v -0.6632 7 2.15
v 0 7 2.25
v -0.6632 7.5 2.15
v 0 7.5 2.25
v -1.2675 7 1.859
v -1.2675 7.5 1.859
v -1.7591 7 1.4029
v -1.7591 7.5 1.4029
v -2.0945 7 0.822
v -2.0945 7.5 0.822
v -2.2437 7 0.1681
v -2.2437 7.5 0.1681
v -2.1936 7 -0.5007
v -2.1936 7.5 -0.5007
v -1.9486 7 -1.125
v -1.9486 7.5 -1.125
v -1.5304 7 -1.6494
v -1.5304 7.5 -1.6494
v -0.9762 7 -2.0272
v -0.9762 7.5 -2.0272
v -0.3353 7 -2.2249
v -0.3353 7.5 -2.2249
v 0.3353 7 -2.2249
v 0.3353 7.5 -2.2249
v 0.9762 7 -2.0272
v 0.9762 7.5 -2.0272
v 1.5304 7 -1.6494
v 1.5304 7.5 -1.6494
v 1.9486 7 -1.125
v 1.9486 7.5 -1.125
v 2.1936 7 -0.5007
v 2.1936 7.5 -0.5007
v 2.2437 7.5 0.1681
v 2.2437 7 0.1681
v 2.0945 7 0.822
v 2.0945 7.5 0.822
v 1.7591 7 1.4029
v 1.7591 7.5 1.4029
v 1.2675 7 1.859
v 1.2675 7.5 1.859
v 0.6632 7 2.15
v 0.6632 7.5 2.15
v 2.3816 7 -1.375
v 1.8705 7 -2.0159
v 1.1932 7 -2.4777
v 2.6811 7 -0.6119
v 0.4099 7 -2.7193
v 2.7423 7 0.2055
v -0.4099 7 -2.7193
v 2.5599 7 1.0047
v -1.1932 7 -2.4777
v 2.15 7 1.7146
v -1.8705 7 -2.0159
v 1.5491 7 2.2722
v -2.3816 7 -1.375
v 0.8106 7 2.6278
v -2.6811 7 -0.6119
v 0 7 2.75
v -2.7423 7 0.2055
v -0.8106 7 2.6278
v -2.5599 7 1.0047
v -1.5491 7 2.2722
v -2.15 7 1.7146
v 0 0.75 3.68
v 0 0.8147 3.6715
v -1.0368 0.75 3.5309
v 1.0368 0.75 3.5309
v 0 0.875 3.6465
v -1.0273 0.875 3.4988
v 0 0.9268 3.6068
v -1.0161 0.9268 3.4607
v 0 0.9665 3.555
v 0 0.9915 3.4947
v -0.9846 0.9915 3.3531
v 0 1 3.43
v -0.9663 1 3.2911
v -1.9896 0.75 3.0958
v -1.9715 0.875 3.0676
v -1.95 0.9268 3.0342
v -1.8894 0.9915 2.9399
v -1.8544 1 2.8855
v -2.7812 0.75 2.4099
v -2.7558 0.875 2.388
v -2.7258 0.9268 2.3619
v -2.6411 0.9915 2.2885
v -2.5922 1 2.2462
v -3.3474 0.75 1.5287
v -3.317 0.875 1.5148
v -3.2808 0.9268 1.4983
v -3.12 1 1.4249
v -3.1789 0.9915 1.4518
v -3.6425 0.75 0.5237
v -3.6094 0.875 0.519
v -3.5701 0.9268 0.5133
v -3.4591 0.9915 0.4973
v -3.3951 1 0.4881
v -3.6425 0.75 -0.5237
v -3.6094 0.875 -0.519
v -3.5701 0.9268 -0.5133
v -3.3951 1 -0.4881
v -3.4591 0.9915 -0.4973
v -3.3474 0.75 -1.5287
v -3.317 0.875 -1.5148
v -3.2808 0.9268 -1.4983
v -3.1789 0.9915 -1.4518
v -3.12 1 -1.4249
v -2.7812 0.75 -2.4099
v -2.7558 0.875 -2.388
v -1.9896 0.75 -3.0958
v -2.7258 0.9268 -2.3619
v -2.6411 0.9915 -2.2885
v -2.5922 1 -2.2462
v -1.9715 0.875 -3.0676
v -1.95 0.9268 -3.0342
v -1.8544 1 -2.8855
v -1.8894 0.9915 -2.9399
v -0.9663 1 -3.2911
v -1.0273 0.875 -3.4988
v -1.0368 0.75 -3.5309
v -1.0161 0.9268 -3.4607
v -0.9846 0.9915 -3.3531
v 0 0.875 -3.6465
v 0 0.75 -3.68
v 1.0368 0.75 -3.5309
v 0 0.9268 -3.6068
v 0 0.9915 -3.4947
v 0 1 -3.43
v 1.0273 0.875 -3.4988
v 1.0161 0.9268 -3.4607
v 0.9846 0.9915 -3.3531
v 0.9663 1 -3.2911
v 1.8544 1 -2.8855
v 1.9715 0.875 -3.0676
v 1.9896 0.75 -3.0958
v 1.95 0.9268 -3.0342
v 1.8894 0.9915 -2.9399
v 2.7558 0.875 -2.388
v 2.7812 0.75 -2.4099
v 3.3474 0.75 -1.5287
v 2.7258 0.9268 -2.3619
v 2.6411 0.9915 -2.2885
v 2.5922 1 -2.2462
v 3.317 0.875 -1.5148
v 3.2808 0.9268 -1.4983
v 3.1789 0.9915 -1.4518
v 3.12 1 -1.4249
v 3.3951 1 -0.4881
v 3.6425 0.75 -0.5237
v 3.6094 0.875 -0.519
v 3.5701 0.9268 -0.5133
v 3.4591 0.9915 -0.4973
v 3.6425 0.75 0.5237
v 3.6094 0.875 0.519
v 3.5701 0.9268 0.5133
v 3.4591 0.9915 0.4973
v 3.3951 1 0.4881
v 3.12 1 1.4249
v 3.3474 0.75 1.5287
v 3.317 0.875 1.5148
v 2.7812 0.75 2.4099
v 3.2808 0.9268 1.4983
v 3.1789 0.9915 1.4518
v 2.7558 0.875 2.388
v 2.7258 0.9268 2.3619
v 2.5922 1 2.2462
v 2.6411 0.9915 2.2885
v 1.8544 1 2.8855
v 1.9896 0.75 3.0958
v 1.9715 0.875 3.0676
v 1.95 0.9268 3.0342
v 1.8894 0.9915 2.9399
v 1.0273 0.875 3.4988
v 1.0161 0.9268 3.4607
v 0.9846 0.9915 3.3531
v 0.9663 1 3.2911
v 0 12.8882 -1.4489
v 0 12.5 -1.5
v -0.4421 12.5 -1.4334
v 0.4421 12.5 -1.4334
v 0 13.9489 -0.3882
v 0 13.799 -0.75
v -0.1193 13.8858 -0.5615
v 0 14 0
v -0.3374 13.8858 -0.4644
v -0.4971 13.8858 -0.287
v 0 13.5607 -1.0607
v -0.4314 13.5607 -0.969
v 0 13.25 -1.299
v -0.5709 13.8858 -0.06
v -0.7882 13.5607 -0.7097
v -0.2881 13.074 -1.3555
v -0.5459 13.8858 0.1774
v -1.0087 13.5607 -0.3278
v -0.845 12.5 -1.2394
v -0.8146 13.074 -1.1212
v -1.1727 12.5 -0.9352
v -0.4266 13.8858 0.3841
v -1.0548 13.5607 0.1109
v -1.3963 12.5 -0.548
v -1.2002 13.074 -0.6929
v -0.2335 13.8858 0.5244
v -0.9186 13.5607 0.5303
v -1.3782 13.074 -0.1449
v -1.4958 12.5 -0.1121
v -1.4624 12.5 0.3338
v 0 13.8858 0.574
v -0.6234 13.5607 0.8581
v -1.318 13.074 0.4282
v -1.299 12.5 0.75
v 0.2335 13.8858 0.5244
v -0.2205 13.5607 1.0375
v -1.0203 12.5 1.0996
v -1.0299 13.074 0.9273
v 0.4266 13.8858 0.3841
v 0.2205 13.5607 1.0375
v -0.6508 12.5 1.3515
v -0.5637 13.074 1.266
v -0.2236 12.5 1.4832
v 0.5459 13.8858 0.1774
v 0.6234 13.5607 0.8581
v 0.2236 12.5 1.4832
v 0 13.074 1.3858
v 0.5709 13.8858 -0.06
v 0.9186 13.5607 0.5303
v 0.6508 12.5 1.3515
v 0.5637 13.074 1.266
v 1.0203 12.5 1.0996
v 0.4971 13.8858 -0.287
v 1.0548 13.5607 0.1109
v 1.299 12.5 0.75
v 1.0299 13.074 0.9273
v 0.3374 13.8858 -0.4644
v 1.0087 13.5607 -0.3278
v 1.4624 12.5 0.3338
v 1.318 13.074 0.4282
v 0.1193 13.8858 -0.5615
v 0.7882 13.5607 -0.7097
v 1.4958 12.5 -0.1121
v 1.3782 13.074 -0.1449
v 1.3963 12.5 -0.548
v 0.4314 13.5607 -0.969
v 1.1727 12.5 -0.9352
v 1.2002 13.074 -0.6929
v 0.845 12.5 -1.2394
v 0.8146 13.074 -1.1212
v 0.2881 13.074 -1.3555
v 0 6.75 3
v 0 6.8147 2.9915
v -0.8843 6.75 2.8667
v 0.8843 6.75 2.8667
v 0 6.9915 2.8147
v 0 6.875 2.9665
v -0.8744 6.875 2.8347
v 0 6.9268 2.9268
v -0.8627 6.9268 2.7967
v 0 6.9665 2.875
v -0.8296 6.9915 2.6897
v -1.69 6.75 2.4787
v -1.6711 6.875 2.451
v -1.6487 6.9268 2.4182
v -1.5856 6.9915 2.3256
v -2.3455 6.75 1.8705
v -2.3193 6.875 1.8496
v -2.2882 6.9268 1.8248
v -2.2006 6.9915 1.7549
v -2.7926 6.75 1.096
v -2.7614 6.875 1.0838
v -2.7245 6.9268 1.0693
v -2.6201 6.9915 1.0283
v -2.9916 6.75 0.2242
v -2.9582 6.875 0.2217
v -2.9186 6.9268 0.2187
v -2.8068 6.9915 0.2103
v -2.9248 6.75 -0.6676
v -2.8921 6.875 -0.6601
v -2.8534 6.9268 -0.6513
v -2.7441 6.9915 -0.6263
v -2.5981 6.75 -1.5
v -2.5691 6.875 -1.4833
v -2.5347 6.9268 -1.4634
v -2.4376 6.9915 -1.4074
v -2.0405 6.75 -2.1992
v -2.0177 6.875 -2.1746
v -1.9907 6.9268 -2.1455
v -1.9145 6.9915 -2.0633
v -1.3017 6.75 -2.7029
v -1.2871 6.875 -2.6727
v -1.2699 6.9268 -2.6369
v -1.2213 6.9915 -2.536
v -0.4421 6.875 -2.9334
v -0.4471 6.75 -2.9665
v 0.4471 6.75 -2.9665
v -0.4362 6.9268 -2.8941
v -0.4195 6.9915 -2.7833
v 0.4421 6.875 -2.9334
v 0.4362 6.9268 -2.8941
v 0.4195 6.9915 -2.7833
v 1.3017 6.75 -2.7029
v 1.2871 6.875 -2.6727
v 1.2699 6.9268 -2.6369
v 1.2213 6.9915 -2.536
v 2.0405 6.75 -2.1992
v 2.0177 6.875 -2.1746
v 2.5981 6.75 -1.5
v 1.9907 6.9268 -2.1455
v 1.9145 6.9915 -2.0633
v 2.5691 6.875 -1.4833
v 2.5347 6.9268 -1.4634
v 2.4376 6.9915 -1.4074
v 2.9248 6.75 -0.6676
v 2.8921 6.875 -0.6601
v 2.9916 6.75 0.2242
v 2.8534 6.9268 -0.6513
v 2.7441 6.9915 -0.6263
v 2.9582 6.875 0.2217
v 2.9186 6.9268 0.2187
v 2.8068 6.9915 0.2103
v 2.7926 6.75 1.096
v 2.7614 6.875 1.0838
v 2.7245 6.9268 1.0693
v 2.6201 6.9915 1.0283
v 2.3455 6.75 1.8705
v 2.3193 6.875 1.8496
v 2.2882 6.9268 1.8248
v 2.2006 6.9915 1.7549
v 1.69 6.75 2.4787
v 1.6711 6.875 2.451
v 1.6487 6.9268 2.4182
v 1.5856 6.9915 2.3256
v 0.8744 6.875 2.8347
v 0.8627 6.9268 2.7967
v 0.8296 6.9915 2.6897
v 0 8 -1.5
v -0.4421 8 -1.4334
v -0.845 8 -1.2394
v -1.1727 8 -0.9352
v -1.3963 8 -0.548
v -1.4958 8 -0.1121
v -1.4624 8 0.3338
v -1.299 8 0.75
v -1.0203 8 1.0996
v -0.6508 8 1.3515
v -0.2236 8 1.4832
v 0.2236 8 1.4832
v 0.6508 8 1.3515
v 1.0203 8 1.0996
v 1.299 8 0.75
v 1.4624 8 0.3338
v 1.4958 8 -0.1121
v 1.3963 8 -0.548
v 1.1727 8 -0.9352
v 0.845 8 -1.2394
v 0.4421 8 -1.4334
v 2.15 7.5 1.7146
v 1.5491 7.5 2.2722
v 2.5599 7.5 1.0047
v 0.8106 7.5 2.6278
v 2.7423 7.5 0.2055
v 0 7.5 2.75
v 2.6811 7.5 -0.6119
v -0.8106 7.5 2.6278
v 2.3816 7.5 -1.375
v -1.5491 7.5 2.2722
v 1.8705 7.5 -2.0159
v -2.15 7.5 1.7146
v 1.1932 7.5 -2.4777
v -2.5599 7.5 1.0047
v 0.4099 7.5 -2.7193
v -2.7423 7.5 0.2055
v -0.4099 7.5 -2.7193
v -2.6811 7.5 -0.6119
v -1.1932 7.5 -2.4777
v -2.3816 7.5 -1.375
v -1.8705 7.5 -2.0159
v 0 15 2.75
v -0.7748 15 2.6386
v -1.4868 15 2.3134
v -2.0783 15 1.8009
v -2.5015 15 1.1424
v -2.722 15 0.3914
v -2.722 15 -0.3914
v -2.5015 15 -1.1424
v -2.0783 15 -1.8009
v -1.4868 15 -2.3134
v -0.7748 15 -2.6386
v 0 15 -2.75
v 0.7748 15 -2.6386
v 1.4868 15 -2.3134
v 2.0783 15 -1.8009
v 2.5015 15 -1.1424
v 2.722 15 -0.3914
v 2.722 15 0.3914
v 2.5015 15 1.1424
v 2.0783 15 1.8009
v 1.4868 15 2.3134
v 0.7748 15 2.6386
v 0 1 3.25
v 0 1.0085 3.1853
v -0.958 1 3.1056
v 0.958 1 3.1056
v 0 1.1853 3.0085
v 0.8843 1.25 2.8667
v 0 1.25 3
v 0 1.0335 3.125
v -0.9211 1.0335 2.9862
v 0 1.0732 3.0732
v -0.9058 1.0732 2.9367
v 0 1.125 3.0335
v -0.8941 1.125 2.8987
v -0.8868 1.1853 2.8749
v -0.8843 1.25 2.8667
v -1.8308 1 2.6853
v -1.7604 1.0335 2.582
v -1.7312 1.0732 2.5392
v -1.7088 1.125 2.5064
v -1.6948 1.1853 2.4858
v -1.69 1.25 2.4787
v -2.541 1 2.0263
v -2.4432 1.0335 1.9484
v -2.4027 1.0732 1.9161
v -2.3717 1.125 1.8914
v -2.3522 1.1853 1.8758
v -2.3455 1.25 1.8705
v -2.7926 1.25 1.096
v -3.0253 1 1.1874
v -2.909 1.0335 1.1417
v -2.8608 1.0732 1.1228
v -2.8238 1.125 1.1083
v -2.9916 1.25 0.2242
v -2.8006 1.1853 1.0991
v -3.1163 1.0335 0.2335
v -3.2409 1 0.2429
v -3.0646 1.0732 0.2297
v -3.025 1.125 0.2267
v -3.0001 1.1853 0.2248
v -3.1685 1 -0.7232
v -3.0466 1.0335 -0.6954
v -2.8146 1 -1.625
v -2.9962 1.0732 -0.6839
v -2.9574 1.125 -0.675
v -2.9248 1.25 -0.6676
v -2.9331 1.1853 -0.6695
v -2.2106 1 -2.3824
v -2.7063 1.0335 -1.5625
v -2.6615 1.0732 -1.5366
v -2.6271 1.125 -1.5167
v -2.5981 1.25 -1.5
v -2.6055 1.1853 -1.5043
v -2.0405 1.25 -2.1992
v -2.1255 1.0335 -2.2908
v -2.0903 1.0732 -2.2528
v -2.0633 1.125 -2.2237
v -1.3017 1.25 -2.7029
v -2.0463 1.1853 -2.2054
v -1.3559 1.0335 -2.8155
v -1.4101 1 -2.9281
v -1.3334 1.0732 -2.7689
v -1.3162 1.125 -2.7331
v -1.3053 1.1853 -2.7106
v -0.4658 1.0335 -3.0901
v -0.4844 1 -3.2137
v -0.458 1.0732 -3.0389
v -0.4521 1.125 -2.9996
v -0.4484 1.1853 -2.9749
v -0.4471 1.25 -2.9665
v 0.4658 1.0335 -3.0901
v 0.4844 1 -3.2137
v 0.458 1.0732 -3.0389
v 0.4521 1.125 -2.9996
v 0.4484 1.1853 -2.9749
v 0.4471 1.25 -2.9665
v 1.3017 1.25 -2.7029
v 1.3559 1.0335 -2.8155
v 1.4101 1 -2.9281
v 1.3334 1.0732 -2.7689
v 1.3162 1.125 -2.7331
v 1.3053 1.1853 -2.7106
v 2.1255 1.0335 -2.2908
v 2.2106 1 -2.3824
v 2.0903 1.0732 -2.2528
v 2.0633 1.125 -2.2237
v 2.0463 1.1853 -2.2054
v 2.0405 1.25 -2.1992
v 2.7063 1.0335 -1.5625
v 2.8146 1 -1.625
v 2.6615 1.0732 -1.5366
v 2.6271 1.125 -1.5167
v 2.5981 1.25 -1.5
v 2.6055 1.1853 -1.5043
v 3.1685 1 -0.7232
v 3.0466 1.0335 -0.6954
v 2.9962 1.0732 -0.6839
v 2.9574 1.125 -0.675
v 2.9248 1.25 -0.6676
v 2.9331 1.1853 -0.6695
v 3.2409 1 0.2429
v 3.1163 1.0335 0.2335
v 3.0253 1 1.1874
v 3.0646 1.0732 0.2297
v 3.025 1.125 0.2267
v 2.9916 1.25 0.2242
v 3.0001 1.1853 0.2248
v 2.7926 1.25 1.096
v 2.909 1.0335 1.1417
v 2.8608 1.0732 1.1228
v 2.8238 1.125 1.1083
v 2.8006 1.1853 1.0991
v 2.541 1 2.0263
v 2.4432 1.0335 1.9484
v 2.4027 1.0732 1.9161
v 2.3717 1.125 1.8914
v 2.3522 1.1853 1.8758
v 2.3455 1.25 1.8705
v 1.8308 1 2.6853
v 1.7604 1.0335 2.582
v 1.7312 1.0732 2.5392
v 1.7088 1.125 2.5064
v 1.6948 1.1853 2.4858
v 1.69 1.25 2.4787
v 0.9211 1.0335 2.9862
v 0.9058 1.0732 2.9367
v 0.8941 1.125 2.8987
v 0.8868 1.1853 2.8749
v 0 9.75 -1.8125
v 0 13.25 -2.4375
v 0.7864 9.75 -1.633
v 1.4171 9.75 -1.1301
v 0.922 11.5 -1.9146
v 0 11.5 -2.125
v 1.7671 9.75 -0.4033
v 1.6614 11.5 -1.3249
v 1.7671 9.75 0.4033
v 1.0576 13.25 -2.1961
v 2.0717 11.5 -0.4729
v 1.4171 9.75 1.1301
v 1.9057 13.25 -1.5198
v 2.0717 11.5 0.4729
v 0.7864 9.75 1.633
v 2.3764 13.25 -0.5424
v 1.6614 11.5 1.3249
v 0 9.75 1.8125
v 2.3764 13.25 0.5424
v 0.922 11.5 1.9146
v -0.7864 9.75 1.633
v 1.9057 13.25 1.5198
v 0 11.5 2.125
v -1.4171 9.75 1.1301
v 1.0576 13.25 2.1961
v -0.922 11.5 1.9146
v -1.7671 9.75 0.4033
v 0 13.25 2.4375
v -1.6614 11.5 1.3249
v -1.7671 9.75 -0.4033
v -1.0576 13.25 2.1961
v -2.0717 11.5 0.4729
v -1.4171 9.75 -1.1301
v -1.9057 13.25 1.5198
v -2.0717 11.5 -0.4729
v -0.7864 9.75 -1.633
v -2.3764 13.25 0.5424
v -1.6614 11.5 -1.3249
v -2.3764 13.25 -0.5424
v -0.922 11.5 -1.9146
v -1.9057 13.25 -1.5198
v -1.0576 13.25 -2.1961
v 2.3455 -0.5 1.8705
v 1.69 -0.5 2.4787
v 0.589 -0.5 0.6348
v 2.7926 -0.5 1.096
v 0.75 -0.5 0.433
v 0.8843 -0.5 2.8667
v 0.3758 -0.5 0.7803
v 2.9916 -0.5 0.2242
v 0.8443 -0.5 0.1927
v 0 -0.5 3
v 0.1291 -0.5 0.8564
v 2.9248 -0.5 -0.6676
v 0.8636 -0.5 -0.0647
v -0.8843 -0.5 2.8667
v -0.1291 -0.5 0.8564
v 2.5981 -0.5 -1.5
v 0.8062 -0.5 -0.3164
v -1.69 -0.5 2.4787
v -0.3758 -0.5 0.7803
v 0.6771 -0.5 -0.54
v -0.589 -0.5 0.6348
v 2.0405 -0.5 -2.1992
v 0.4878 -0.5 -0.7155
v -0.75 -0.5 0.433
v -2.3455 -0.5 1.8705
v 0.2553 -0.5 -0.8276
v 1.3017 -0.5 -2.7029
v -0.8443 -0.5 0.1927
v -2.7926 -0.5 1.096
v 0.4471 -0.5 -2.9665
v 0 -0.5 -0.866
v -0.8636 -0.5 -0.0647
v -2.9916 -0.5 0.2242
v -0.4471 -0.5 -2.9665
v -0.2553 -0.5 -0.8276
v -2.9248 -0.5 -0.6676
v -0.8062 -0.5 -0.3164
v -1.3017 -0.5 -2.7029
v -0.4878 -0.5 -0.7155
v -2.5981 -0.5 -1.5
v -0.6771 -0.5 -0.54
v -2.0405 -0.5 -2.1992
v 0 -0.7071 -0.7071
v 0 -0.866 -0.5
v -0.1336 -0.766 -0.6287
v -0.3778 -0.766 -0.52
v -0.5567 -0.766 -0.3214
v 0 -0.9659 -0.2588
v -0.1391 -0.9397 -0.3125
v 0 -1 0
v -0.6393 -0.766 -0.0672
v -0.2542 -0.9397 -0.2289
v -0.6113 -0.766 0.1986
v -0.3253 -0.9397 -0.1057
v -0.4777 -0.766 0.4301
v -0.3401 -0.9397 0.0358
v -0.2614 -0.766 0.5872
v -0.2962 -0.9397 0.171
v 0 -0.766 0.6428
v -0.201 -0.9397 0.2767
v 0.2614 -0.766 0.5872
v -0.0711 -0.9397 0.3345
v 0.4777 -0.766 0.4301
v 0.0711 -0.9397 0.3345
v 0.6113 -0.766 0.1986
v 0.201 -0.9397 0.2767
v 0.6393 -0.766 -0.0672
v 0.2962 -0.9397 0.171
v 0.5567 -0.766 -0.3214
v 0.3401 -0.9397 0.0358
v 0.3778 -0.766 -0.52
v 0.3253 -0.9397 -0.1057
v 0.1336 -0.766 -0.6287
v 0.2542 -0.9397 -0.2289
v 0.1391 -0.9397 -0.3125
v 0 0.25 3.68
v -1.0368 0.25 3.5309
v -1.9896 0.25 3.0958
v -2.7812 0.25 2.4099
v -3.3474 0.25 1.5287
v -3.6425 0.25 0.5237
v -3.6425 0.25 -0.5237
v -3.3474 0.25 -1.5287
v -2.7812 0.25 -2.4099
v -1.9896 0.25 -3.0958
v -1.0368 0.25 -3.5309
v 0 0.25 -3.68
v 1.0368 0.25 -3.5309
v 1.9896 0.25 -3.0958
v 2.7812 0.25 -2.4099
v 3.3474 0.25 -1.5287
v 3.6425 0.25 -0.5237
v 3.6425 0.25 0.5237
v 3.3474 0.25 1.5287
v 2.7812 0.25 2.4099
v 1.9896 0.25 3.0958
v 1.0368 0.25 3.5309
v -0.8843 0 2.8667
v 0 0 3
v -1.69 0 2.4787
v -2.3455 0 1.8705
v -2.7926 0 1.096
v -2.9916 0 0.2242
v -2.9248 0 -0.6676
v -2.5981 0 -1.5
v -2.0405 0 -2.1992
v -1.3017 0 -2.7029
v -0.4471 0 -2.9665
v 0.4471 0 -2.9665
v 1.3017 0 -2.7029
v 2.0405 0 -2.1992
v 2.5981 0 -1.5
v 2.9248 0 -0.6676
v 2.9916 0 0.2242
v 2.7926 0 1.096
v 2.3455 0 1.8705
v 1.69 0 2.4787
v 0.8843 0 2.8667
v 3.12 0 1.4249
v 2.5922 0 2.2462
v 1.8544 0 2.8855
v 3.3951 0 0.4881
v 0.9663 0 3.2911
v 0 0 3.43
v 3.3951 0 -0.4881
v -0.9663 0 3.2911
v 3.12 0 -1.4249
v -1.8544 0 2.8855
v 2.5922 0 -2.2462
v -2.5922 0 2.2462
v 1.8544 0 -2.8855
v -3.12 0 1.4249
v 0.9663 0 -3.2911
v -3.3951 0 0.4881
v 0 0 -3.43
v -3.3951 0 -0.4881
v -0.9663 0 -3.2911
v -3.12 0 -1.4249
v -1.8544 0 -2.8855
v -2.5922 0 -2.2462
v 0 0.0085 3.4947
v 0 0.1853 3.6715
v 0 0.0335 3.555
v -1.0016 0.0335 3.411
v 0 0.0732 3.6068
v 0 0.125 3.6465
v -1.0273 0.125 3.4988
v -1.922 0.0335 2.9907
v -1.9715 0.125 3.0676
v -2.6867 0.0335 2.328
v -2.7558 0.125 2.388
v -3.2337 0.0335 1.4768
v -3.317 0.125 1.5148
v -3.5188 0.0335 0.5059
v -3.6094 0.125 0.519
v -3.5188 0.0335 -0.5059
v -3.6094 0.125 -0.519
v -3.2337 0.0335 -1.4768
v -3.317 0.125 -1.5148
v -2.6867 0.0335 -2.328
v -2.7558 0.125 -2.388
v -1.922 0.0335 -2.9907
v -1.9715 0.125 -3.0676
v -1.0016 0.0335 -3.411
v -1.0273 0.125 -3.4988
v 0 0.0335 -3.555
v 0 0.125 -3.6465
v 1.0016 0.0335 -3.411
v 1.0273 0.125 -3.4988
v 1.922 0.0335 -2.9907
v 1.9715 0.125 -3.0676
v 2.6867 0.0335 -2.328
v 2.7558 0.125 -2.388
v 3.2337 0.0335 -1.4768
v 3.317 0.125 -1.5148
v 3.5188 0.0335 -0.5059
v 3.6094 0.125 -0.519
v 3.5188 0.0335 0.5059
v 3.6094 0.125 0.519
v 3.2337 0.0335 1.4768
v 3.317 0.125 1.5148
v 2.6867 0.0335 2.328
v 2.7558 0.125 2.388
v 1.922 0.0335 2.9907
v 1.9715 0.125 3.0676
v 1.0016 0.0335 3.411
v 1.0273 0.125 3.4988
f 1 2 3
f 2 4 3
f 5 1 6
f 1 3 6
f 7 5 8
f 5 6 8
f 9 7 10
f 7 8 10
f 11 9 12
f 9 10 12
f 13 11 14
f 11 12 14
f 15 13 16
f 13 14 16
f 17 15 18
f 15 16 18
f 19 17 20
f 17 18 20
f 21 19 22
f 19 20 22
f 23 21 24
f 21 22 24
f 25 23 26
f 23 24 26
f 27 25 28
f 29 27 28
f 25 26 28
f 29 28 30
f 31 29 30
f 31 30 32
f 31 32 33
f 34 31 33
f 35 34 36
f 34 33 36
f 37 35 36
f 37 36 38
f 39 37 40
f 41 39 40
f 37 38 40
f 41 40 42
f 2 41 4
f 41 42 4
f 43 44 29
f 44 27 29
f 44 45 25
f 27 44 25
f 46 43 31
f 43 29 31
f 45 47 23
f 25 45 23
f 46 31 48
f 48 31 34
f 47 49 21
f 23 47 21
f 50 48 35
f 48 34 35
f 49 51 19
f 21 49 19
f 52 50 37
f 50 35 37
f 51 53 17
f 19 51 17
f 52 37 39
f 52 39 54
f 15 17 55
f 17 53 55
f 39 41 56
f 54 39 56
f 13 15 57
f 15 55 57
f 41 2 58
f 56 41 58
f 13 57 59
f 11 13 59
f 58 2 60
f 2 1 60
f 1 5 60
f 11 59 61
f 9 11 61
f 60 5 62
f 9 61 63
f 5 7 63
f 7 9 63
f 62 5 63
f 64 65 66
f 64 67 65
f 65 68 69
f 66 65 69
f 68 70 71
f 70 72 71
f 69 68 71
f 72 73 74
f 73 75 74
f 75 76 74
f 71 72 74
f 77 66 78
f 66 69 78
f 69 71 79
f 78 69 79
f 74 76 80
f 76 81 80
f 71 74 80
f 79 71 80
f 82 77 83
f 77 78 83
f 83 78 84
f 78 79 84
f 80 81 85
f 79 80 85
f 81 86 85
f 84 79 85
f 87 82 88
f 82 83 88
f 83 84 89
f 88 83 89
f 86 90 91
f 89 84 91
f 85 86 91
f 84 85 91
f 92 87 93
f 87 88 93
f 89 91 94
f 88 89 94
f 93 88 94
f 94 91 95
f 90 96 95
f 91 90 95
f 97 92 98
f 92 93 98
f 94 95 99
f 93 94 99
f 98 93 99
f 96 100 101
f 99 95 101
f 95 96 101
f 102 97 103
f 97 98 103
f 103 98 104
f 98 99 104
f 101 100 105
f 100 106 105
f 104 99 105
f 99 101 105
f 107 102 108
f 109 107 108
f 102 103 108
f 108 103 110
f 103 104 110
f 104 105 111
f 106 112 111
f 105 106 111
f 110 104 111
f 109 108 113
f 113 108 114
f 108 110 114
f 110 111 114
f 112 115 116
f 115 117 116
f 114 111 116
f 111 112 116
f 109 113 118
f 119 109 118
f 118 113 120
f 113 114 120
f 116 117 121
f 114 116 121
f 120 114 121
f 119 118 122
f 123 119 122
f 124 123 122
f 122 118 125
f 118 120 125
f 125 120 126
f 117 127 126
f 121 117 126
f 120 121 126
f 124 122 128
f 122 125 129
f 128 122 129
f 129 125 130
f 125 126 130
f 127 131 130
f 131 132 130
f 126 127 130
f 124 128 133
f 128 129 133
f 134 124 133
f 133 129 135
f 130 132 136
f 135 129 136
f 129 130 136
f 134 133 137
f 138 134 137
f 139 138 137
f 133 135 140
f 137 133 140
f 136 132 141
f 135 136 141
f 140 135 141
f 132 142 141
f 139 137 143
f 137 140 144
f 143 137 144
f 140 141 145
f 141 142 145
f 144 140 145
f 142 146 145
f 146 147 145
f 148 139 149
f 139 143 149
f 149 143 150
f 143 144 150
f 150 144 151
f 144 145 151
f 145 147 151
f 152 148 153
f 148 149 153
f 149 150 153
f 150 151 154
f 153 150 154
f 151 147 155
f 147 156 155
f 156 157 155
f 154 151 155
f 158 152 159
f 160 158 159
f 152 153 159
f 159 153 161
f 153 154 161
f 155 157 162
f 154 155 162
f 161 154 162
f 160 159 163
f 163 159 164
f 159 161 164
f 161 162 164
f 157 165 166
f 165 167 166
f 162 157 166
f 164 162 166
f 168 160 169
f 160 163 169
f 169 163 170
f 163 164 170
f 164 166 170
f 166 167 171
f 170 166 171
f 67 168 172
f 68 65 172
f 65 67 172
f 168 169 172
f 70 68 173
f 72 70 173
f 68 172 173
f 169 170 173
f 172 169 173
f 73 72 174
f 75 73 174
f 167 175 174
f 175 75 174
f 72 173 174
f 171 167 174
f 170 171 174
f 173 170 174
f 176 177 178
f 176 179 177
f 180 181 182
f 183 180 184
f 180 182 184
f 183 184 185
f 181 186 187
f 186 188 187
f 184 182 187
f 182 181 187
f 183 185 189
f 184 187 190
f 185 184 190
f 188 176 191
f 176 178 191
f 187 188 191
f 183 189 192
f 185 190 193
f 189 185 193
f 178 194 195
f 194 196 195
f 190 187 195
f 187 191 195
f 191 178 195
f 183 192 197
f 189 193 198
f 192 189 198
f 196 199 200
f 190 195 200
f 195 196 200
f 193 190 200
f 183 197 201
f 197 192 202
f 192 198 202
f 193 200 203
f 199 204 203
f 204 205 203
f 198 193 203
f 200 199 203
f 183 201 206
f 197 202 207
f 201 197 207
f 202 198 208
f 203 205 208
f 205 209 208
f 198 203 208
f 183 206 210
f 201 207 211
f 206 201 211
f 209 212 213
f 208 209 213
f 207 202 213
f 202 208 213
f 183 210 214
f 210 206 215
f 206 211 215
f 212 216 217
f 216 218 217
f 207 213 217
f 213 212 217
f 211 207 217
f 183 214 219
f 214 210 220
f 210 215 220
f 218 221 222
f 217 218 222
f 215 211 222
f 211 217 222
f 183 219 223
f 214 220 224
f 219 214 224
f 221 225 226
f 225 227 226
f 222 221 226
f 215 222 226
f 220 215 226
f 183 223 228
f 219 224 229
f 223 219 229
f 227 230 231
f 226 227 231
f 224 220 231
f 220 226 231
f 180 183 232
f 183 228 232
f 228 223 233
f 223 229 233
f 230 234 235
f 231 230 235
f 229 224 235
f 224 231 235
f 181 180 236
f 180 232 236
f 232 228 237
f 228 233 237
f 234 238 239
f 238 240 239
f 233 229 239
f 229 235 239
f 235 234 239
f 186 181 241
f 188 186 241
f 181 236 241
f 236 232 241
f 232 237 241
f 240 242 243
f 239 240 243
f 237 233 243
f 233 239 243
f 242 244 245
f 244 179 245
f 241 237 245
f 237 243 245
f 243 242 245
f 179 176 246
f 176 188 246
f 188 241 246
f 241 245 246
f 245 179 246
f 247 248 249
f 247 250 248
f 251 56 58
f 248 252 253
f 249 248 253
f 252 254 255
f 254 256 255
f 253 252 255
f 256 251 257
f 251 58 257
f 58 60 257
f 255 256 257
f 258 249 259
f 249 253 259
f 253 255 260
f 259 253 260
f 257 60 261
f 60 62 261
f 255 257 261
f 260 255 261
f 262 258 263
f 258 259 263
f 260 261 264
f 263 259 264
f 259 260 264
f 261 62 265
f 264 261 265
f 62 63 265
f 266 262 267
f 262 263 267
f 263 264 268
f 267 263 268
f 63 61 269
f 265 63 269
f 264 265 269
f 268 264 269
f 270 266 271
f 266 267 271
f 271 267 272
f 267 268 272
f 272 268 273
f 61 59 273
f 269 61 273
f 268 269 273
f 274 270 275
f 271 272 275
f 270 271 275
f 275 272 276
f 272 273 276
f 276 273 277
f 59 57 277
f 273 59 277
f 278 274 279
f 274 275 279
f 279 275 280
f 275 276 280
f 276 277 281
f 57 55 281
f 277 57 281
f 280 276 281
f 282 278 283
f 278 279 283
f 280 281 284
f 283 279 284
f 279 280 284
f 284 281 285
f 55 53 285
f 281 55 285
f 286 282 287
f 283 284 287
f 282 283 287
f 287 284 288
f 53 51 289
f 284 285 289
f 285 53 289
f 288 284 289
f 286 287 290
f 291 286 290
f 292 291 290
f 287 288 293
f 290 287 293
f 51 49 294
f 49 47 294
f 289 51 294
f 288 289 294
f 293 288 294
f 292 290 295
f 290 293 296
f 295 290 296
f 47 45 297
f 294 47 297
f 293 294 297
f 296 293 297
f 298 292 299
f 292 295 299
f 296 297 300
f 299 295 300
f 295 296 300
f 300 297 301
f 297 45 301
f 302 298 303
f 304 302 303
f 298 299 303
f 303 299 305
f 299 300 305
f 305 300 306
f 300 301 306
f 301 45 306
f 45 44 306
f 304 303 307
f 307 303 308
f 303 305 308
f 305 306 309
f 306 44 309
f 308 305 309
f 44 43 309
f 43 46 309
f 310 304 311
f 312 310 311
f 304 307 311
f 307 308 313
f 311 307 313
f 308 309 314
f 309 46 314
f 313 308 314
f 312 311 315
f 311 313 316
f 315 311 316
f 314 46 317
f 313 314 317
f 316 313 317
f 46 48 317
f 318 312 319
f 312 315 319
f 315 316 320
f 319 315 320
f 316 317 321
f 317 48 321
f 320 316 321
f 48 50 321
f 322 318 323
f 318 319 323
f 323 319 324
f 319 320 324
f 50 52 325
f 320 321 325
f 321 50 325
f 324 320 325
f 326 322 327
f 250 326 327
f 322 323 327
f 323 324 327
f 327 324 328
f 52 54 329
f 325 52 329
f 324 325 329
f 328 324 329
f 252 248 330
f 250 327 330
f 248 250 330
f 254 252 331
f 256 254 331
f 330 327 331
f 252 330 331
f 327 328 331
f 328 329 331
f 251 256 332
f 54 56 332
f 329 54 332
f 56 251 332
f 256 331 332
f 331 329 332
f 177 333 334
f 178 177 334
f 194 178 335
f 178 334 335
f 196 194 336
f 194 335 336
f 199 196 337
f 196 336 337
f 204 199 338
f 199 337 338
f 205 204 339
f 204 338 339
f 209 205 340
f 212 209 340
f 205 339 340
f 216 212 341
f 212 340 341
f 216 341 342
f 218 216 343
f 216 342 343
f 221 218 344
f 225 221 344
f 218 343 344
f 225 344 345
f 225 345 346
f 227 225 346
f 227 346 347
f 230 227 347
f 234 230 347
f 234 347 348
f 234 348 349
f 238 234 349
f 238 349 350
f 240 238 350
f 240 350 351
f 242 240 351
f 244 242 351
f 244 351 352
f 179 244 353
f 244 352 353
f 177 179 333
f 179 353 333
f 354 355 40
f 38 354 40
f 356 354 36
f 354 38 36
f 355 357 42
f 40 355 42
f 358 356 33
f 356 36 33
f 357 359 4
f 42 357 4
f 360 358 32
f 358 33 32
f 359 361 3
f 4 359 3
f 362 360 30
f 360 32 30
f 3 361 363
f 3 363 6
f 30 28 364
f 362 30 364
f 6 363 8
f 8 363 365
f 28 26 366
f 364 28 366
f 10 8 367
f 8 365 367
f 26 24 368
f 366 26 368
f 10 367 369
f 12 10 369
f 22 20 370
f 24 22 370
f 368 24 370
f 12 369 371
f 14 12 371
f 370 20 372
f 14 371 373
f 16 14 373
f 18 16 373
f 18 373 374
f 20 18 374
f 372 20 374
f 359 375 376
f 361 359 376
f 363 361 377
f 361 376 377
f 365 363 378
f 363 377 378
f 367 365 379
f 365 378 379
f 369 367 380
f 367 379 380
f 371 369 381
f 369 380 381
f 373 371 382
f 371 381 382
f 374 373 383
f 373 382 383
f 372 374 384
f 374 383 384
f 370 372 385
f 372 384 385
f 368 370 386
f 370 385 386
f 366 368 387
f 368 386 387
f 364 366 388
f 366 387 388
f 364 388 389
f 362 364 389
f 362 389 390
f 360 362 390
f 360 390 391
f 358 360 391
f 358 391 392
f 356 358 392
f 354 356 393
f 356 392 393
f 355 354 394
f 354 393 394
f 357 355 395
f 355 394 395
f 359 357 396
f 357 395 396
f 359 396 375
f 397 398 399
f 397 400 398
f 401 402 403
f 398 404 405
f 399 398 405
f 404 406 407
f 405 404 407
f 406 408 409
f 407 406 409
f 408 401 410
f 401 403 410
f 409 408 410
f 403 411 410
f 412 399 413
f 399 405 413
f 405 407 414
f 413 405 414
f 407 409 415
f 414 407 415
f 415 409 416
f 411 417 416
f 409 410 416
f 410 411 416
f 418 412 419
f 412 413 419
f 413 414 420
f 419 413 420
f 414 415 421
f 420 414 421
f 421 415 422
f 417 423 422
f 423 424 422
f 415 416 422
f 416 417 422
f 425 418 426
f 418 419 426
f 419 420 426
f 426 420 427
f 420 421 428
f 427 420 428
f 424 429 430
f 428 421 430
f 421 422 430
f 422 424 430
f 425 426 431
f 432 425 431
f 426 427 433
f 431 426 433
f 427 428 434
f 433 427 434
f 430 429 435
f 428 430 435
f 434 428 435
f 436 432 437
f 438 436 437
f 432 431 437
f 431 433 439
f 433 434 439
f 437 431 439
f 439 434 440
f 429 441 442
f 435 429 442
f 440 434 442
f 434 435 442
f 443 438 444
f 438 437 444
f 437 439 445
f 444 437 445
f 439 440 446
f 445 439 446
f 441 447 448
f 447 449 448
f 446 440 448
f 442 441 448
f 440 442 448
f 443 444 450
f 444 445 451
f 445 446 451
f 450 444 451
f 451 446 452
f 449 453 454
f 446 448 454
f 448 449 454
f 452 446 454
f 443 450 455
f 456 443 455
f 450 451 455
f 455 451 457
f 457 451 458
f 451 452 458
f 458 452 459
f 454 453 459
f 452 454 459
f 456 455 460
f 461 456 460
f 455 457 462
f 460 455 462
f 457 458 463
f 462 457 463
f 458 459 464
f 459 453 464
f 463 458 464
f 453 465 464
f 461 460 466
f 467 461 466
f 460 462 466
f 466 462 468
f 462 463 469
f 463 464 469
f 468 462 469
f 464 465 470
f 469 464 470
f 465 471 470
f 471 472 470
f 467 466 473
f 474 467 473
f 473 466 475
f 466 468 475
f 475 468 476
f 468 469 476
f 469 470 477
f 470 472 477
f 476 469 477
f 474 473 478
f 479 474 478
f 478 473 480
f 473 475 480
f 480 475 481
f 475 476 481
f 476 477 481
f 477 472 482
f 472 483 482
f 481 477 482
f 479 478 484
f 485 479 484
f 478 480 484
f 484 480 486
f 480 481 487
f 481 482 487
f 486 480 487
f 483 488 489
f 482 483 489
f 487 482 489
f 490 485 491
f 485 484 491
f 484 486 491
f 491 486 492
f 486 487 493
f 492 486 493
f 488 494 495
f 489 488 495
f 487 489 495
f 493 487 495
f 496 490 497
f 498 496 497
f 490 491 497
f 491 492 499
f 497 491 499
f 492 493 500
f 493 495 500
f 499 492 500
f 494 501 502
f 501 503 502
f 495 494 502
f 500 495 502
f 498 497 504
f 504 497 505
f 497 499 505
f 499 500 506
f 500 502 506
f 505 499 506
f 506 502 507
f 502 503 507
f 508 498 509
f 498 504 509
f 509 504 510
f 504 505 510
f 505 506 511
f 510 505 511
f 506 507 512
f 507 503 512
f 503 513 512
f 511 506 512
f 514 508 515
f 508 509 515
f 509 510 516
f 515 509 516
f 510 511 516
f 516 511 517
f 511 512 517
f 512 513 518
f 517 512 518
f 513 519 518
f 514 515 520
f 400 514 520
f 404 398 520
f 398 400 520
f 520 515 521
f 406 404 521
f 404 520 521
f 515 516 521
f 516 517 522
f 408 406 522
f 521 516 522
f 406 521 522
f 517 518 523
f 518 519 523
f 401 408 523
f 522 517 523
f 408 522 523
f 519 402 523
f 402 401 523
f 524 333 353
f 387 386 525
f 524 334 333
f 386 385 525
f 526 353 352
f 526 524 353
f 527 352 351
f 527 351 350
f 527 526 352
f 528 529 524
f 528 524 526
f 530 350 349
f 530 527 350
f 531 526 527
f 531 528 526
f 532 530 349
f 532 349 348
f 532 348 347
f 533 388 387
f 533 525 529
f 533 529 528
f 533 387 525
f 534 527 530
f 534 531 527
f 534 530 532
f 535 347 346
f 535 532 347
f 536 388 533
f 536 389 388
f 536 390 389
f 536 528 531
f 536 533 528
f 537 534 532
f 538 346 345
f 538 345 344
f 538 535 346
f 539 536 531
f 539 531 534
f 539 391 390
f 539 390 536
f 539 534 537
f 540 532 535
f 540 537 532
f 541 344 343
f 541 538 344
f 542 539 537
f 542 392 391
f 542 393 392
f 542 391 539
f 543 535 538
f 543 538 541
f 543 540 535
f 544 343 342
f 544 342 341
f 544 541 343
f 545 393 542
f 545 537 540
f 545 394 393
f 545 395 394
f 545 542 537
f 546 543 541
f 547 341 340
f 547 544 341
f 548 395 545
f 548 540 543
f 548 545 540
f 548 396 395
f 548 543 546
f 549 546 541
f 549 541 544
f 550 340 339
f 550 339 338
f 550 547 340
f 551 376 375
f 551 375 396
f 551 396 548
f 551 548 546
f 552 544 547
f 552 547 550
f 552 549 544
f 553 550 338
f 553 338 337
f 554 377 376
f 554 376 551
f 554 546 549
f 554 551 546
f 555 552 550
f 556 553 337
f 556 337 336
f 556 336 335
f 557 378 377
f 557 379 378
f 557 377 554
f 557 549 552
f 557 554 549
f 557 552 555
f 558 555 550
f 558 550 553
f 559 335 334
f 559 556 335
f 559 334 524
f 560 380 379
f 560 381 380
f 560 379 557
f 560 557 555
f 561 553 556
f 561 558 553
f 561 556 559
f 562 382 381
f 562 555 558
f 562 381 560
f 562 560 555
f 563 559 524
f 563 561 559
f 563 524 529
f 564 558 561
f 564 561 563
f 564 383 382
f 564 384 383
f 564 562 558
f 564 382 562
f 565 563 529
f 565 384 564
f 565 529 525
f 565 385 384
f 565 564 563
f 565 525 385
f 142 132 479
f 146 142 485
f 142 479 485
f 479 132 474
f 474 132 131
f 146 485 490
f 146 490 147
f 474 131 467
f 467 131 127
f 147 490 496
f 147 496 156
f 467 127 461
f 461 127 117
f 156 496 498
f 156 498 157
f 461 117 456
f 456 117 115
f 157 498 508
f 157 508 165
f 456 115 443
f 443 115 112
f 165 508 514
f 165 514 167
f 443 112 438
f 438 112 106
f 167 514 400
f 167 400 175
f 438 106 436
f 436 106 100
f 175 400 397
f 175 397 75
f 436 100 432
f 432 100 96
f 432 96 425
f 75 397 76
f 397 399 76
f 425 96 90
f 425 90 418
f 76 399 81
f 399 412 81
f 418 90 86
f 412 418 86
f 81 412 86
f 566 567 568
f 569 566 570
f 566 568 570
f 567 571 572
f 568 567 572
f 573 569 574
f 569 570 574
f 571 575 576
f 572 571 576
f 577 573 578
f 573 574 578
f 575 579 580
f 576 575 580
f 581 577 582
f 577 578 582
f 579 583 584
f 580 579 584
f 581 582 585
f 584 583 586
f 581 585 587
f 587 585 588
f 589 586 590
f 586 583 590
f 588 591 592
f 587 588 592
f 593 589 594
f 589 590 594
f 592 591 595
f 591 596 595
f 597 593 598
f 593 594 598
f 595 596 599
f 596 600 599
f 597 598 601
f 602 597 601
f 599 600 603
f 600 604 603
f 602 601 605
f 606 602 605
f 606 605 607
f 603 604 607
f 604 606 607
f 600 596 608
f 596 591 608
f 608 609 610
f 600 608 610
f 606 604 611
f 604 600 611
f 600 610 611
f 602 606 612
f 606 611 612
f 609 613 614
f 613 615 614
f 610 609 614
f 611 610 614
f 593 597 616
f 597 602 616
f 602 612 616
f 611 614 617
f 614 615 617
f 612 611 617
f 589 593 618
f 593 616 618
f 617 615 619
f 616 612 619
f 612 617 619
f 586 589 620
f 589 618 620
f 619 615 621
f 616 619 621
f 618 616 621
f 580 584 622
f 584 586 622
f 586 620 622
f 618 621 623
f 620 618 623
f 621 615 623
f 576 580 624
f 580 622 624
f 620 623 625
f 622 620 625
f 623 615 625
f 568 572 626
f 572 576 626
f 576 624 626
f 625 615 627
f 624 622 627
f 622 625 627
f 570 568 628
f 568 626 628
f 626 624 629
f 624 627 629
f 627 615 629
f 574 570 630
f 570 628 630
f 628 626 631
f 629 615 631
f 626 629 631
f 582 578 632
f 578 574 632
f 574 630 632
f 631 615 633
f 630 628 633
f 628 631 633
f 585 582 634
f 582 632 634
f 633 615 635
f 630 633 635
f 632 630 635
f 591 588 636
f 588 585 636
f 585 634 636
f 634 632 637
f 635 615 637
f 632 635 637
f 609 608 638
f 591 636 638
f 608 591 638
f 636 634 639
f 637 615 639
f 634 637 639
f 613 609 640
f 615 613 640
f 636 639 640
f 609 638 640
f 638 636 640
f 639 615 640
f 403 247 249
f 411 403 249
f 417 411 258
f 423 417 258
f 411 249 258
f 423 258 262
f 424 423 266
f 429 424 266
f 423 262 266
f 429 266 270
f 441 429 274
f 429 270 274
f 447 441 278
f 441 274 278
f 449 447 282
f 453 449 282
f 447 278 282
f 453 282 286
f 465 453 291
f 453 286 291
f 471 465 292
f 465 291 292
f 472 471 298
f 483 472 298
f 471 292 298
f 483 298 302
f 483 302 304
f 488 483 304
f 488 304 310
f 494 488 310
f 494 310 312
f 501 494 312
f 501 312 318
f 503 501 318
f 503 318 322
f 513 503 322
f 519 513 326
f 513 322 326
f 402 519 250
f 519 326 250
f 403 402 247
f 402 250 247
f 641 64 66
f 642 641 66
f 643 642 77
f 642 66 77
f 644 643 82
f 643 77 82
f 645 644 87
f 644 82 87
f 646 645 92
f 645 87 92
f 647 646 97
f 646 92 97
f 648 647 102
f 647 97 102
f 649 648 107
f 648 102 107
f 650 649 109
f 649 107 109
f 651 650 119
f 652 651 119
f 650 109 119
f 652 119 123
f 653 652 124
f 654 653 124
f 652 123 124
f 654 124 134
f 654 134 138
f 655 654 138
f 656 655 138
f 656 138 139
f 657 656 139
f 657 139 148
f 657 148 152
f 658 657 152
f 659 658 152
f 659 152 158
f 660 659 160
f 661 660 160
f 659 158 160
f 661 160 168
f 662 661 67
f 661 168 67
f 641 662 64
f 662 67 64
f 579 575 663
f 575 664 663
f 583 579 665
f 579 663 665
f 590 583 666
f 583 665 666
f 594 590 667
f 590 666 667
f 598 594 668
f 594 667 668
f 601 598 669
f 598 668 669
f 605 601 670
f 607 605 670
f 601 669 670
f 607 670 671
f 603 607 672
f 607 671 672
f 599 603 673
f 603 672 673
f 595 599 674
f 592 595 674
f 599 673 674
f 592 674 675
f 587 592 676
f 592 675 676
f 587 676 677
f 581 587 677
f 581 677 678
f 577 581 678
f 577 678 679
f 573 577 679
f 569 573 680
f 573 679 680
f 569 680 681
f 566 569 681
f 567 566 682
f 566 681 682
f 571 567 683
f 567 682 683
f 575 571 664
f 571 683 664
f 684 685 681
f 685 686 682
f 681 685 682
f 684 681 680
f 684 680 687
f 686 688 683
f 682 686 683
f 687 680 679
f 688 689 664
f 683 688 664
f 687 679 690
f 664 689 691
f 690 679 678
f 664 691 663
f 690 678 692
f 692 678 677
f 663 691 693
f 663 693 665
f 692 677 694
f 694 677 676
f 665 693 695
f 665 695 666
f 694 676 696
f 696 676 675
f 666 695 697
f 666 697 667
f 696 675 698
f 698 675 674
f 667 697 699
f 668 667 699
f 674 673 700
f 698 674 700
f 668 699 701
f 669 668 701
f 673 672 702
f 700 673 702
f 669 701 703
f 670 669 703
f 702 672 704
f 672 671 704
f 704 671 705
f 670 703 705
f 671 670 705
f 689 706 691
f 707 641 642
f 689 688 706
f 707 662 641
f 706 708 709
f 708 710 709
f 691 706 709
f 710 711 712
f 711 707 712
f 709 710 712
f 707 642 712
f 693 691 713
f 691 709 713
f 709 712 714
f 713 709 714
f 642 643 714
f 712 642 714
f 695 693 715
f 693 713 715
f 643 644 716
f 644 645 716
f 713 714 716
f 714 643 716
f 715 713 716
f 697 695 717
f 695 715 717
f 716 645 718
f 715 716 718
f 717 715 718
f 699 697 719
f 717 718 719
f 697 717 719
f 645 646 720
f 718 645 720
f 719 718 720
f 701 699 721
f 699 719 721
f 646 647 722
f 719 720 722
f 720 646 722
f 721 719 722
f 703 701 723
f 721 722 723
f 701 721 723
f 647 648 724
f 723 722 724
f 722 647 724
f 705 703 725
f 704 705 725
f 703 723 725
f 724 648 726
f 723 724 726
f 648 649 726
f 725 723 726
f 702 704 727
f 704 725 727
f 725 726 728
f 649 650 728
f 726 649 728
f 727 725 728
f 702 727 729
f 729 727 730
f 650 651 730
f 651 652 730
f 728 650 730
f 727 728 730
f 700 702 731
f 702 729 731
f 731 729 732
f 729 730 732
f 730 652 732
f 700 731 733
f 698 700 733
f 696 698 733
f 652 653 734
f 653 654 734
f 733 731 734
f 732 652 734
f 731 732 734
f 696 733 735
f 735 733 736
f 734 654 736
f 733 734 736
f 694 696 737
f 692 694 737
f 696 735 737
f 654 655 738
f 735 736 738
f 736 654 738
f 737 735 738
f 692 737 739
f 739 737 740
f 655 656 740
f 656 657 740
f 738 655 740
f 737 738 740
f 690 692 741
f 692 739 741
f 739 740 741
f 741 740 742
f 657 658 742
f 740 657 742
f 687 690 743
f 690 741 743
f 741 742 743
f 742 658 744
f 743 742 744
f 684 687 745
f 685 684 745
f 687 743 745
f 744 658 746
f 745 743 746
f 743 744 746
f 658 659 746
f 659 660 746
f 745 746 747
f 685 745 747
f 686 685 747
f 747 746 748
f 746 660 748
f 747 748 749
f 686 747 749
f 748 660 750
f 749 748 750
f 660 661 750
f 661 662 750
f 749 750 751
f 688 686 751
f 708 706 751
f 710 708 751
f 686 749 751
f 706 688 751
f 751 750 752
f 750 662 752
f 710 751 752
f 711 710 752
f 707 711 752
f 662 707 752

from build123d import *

# Parameters (mm, degrees)
SKETCH2_W = 3
SKETCH2_H = 0.5
FILLET1_R = 0.25


with BuildPart() as part:
    # Sketch1 → Revolve1 (revolve)
    with BuildSketch(Plane(origin=(0, 0, 0), x_dir=(0, 0, -1), z_dir=(1, 0, 0)), mode=Mode.PRIVATE) as revolve1_sk:
        Polygon((0, 0), (3.68, 0), (3.68, 1), (3, 1), (3, 7), (2.25, 7), (2.25, 7.5), (2.75, 7.5), (2.75, 15), (0, 15), align=None)
    revolve(revolve1_sk.sketch.rotate(Axis((0, 15, 0), (0, -1, 0)), 180), axis=Axis((0, 15, 0), (0, -1, 0)))

    # Sketch2 → Revolve2 (revolve)
    with BuildSketch(Plane(origin=(0, 0, 0), x_dir=(0, 0, -1), z_dir=(1, 0, 0)), mode=Mode.PRIVATE) as revolve2_sk:
        with Locations((1.5, -0.25)):
            Rectangle(SKETCH2_W, SKETCH2_H)
    revolve(revolve2_sk.sketch.rotate(Axis((0, 0, 0), (0, -1, 0)), 180), axis=Axis((0, 0, 0), (0, -1, 0)))

    # Sketch3 → Revolve3 (revolve)
    with BuildSketch(Plane(origin=(0, 0, 0), x_dir=(0, 0, -1), z_dir=(1, 0, 0))):
        with BuildLine():
            Line((0, -1), (0, 1))
            ThreePointArc((0, 1), (1, 0), (0, -1))
        make_face()
    revolve(axis=Axis((0, -1, 0), (0, 1, 0)))

    # Fillet1
    fillet1_edges = [part.edges().sort_by_distance(p)[0] for p in [
        (0, 1, -3.68),
        (0, 0, -3.68),
        (0, 7, -3),
        (0, 1, -3),
    ]]
    fillet(fillet1_edges, radius=FILLET1_R)

    # Sketch5 → Cut-Revolve1 (revolve, cut)
    with BuildSketch(Plane(origin=(0, 0, 0), x_dir=(0, 0, -1), z_dir=(1, 0, 0))):
        Polygon((0, 15), (0, 8), (1.5, 8), (2.75, 15), align=None)
    revolve(axis=Axis((0, 15, 0), (0, -1, 0)), mode=Mode.SUBTRACT)

    # Sketch6 → Revolve4 (revolve)
    with BuildSketch(Plane(origin=(0, 0, 0), x_dir=(0, 0, -1), z_dir=(1, 0, 0))):
        with BuildLine():
            Line((0, 8), (0, 12.5))
            Line((0, 12.5), (0, 14))
            ThreePointArc((0, 14), (1.060660172, 13.560660172), (1.5, 12.5))
            Line((1.5, 12.5), (1.5, 8))
            Line((1.5, 8), (0, 8))
        make_face()
    revolve(axis=Axis((0, 8, 0), (0, 1, 0)))


solid = part.part
